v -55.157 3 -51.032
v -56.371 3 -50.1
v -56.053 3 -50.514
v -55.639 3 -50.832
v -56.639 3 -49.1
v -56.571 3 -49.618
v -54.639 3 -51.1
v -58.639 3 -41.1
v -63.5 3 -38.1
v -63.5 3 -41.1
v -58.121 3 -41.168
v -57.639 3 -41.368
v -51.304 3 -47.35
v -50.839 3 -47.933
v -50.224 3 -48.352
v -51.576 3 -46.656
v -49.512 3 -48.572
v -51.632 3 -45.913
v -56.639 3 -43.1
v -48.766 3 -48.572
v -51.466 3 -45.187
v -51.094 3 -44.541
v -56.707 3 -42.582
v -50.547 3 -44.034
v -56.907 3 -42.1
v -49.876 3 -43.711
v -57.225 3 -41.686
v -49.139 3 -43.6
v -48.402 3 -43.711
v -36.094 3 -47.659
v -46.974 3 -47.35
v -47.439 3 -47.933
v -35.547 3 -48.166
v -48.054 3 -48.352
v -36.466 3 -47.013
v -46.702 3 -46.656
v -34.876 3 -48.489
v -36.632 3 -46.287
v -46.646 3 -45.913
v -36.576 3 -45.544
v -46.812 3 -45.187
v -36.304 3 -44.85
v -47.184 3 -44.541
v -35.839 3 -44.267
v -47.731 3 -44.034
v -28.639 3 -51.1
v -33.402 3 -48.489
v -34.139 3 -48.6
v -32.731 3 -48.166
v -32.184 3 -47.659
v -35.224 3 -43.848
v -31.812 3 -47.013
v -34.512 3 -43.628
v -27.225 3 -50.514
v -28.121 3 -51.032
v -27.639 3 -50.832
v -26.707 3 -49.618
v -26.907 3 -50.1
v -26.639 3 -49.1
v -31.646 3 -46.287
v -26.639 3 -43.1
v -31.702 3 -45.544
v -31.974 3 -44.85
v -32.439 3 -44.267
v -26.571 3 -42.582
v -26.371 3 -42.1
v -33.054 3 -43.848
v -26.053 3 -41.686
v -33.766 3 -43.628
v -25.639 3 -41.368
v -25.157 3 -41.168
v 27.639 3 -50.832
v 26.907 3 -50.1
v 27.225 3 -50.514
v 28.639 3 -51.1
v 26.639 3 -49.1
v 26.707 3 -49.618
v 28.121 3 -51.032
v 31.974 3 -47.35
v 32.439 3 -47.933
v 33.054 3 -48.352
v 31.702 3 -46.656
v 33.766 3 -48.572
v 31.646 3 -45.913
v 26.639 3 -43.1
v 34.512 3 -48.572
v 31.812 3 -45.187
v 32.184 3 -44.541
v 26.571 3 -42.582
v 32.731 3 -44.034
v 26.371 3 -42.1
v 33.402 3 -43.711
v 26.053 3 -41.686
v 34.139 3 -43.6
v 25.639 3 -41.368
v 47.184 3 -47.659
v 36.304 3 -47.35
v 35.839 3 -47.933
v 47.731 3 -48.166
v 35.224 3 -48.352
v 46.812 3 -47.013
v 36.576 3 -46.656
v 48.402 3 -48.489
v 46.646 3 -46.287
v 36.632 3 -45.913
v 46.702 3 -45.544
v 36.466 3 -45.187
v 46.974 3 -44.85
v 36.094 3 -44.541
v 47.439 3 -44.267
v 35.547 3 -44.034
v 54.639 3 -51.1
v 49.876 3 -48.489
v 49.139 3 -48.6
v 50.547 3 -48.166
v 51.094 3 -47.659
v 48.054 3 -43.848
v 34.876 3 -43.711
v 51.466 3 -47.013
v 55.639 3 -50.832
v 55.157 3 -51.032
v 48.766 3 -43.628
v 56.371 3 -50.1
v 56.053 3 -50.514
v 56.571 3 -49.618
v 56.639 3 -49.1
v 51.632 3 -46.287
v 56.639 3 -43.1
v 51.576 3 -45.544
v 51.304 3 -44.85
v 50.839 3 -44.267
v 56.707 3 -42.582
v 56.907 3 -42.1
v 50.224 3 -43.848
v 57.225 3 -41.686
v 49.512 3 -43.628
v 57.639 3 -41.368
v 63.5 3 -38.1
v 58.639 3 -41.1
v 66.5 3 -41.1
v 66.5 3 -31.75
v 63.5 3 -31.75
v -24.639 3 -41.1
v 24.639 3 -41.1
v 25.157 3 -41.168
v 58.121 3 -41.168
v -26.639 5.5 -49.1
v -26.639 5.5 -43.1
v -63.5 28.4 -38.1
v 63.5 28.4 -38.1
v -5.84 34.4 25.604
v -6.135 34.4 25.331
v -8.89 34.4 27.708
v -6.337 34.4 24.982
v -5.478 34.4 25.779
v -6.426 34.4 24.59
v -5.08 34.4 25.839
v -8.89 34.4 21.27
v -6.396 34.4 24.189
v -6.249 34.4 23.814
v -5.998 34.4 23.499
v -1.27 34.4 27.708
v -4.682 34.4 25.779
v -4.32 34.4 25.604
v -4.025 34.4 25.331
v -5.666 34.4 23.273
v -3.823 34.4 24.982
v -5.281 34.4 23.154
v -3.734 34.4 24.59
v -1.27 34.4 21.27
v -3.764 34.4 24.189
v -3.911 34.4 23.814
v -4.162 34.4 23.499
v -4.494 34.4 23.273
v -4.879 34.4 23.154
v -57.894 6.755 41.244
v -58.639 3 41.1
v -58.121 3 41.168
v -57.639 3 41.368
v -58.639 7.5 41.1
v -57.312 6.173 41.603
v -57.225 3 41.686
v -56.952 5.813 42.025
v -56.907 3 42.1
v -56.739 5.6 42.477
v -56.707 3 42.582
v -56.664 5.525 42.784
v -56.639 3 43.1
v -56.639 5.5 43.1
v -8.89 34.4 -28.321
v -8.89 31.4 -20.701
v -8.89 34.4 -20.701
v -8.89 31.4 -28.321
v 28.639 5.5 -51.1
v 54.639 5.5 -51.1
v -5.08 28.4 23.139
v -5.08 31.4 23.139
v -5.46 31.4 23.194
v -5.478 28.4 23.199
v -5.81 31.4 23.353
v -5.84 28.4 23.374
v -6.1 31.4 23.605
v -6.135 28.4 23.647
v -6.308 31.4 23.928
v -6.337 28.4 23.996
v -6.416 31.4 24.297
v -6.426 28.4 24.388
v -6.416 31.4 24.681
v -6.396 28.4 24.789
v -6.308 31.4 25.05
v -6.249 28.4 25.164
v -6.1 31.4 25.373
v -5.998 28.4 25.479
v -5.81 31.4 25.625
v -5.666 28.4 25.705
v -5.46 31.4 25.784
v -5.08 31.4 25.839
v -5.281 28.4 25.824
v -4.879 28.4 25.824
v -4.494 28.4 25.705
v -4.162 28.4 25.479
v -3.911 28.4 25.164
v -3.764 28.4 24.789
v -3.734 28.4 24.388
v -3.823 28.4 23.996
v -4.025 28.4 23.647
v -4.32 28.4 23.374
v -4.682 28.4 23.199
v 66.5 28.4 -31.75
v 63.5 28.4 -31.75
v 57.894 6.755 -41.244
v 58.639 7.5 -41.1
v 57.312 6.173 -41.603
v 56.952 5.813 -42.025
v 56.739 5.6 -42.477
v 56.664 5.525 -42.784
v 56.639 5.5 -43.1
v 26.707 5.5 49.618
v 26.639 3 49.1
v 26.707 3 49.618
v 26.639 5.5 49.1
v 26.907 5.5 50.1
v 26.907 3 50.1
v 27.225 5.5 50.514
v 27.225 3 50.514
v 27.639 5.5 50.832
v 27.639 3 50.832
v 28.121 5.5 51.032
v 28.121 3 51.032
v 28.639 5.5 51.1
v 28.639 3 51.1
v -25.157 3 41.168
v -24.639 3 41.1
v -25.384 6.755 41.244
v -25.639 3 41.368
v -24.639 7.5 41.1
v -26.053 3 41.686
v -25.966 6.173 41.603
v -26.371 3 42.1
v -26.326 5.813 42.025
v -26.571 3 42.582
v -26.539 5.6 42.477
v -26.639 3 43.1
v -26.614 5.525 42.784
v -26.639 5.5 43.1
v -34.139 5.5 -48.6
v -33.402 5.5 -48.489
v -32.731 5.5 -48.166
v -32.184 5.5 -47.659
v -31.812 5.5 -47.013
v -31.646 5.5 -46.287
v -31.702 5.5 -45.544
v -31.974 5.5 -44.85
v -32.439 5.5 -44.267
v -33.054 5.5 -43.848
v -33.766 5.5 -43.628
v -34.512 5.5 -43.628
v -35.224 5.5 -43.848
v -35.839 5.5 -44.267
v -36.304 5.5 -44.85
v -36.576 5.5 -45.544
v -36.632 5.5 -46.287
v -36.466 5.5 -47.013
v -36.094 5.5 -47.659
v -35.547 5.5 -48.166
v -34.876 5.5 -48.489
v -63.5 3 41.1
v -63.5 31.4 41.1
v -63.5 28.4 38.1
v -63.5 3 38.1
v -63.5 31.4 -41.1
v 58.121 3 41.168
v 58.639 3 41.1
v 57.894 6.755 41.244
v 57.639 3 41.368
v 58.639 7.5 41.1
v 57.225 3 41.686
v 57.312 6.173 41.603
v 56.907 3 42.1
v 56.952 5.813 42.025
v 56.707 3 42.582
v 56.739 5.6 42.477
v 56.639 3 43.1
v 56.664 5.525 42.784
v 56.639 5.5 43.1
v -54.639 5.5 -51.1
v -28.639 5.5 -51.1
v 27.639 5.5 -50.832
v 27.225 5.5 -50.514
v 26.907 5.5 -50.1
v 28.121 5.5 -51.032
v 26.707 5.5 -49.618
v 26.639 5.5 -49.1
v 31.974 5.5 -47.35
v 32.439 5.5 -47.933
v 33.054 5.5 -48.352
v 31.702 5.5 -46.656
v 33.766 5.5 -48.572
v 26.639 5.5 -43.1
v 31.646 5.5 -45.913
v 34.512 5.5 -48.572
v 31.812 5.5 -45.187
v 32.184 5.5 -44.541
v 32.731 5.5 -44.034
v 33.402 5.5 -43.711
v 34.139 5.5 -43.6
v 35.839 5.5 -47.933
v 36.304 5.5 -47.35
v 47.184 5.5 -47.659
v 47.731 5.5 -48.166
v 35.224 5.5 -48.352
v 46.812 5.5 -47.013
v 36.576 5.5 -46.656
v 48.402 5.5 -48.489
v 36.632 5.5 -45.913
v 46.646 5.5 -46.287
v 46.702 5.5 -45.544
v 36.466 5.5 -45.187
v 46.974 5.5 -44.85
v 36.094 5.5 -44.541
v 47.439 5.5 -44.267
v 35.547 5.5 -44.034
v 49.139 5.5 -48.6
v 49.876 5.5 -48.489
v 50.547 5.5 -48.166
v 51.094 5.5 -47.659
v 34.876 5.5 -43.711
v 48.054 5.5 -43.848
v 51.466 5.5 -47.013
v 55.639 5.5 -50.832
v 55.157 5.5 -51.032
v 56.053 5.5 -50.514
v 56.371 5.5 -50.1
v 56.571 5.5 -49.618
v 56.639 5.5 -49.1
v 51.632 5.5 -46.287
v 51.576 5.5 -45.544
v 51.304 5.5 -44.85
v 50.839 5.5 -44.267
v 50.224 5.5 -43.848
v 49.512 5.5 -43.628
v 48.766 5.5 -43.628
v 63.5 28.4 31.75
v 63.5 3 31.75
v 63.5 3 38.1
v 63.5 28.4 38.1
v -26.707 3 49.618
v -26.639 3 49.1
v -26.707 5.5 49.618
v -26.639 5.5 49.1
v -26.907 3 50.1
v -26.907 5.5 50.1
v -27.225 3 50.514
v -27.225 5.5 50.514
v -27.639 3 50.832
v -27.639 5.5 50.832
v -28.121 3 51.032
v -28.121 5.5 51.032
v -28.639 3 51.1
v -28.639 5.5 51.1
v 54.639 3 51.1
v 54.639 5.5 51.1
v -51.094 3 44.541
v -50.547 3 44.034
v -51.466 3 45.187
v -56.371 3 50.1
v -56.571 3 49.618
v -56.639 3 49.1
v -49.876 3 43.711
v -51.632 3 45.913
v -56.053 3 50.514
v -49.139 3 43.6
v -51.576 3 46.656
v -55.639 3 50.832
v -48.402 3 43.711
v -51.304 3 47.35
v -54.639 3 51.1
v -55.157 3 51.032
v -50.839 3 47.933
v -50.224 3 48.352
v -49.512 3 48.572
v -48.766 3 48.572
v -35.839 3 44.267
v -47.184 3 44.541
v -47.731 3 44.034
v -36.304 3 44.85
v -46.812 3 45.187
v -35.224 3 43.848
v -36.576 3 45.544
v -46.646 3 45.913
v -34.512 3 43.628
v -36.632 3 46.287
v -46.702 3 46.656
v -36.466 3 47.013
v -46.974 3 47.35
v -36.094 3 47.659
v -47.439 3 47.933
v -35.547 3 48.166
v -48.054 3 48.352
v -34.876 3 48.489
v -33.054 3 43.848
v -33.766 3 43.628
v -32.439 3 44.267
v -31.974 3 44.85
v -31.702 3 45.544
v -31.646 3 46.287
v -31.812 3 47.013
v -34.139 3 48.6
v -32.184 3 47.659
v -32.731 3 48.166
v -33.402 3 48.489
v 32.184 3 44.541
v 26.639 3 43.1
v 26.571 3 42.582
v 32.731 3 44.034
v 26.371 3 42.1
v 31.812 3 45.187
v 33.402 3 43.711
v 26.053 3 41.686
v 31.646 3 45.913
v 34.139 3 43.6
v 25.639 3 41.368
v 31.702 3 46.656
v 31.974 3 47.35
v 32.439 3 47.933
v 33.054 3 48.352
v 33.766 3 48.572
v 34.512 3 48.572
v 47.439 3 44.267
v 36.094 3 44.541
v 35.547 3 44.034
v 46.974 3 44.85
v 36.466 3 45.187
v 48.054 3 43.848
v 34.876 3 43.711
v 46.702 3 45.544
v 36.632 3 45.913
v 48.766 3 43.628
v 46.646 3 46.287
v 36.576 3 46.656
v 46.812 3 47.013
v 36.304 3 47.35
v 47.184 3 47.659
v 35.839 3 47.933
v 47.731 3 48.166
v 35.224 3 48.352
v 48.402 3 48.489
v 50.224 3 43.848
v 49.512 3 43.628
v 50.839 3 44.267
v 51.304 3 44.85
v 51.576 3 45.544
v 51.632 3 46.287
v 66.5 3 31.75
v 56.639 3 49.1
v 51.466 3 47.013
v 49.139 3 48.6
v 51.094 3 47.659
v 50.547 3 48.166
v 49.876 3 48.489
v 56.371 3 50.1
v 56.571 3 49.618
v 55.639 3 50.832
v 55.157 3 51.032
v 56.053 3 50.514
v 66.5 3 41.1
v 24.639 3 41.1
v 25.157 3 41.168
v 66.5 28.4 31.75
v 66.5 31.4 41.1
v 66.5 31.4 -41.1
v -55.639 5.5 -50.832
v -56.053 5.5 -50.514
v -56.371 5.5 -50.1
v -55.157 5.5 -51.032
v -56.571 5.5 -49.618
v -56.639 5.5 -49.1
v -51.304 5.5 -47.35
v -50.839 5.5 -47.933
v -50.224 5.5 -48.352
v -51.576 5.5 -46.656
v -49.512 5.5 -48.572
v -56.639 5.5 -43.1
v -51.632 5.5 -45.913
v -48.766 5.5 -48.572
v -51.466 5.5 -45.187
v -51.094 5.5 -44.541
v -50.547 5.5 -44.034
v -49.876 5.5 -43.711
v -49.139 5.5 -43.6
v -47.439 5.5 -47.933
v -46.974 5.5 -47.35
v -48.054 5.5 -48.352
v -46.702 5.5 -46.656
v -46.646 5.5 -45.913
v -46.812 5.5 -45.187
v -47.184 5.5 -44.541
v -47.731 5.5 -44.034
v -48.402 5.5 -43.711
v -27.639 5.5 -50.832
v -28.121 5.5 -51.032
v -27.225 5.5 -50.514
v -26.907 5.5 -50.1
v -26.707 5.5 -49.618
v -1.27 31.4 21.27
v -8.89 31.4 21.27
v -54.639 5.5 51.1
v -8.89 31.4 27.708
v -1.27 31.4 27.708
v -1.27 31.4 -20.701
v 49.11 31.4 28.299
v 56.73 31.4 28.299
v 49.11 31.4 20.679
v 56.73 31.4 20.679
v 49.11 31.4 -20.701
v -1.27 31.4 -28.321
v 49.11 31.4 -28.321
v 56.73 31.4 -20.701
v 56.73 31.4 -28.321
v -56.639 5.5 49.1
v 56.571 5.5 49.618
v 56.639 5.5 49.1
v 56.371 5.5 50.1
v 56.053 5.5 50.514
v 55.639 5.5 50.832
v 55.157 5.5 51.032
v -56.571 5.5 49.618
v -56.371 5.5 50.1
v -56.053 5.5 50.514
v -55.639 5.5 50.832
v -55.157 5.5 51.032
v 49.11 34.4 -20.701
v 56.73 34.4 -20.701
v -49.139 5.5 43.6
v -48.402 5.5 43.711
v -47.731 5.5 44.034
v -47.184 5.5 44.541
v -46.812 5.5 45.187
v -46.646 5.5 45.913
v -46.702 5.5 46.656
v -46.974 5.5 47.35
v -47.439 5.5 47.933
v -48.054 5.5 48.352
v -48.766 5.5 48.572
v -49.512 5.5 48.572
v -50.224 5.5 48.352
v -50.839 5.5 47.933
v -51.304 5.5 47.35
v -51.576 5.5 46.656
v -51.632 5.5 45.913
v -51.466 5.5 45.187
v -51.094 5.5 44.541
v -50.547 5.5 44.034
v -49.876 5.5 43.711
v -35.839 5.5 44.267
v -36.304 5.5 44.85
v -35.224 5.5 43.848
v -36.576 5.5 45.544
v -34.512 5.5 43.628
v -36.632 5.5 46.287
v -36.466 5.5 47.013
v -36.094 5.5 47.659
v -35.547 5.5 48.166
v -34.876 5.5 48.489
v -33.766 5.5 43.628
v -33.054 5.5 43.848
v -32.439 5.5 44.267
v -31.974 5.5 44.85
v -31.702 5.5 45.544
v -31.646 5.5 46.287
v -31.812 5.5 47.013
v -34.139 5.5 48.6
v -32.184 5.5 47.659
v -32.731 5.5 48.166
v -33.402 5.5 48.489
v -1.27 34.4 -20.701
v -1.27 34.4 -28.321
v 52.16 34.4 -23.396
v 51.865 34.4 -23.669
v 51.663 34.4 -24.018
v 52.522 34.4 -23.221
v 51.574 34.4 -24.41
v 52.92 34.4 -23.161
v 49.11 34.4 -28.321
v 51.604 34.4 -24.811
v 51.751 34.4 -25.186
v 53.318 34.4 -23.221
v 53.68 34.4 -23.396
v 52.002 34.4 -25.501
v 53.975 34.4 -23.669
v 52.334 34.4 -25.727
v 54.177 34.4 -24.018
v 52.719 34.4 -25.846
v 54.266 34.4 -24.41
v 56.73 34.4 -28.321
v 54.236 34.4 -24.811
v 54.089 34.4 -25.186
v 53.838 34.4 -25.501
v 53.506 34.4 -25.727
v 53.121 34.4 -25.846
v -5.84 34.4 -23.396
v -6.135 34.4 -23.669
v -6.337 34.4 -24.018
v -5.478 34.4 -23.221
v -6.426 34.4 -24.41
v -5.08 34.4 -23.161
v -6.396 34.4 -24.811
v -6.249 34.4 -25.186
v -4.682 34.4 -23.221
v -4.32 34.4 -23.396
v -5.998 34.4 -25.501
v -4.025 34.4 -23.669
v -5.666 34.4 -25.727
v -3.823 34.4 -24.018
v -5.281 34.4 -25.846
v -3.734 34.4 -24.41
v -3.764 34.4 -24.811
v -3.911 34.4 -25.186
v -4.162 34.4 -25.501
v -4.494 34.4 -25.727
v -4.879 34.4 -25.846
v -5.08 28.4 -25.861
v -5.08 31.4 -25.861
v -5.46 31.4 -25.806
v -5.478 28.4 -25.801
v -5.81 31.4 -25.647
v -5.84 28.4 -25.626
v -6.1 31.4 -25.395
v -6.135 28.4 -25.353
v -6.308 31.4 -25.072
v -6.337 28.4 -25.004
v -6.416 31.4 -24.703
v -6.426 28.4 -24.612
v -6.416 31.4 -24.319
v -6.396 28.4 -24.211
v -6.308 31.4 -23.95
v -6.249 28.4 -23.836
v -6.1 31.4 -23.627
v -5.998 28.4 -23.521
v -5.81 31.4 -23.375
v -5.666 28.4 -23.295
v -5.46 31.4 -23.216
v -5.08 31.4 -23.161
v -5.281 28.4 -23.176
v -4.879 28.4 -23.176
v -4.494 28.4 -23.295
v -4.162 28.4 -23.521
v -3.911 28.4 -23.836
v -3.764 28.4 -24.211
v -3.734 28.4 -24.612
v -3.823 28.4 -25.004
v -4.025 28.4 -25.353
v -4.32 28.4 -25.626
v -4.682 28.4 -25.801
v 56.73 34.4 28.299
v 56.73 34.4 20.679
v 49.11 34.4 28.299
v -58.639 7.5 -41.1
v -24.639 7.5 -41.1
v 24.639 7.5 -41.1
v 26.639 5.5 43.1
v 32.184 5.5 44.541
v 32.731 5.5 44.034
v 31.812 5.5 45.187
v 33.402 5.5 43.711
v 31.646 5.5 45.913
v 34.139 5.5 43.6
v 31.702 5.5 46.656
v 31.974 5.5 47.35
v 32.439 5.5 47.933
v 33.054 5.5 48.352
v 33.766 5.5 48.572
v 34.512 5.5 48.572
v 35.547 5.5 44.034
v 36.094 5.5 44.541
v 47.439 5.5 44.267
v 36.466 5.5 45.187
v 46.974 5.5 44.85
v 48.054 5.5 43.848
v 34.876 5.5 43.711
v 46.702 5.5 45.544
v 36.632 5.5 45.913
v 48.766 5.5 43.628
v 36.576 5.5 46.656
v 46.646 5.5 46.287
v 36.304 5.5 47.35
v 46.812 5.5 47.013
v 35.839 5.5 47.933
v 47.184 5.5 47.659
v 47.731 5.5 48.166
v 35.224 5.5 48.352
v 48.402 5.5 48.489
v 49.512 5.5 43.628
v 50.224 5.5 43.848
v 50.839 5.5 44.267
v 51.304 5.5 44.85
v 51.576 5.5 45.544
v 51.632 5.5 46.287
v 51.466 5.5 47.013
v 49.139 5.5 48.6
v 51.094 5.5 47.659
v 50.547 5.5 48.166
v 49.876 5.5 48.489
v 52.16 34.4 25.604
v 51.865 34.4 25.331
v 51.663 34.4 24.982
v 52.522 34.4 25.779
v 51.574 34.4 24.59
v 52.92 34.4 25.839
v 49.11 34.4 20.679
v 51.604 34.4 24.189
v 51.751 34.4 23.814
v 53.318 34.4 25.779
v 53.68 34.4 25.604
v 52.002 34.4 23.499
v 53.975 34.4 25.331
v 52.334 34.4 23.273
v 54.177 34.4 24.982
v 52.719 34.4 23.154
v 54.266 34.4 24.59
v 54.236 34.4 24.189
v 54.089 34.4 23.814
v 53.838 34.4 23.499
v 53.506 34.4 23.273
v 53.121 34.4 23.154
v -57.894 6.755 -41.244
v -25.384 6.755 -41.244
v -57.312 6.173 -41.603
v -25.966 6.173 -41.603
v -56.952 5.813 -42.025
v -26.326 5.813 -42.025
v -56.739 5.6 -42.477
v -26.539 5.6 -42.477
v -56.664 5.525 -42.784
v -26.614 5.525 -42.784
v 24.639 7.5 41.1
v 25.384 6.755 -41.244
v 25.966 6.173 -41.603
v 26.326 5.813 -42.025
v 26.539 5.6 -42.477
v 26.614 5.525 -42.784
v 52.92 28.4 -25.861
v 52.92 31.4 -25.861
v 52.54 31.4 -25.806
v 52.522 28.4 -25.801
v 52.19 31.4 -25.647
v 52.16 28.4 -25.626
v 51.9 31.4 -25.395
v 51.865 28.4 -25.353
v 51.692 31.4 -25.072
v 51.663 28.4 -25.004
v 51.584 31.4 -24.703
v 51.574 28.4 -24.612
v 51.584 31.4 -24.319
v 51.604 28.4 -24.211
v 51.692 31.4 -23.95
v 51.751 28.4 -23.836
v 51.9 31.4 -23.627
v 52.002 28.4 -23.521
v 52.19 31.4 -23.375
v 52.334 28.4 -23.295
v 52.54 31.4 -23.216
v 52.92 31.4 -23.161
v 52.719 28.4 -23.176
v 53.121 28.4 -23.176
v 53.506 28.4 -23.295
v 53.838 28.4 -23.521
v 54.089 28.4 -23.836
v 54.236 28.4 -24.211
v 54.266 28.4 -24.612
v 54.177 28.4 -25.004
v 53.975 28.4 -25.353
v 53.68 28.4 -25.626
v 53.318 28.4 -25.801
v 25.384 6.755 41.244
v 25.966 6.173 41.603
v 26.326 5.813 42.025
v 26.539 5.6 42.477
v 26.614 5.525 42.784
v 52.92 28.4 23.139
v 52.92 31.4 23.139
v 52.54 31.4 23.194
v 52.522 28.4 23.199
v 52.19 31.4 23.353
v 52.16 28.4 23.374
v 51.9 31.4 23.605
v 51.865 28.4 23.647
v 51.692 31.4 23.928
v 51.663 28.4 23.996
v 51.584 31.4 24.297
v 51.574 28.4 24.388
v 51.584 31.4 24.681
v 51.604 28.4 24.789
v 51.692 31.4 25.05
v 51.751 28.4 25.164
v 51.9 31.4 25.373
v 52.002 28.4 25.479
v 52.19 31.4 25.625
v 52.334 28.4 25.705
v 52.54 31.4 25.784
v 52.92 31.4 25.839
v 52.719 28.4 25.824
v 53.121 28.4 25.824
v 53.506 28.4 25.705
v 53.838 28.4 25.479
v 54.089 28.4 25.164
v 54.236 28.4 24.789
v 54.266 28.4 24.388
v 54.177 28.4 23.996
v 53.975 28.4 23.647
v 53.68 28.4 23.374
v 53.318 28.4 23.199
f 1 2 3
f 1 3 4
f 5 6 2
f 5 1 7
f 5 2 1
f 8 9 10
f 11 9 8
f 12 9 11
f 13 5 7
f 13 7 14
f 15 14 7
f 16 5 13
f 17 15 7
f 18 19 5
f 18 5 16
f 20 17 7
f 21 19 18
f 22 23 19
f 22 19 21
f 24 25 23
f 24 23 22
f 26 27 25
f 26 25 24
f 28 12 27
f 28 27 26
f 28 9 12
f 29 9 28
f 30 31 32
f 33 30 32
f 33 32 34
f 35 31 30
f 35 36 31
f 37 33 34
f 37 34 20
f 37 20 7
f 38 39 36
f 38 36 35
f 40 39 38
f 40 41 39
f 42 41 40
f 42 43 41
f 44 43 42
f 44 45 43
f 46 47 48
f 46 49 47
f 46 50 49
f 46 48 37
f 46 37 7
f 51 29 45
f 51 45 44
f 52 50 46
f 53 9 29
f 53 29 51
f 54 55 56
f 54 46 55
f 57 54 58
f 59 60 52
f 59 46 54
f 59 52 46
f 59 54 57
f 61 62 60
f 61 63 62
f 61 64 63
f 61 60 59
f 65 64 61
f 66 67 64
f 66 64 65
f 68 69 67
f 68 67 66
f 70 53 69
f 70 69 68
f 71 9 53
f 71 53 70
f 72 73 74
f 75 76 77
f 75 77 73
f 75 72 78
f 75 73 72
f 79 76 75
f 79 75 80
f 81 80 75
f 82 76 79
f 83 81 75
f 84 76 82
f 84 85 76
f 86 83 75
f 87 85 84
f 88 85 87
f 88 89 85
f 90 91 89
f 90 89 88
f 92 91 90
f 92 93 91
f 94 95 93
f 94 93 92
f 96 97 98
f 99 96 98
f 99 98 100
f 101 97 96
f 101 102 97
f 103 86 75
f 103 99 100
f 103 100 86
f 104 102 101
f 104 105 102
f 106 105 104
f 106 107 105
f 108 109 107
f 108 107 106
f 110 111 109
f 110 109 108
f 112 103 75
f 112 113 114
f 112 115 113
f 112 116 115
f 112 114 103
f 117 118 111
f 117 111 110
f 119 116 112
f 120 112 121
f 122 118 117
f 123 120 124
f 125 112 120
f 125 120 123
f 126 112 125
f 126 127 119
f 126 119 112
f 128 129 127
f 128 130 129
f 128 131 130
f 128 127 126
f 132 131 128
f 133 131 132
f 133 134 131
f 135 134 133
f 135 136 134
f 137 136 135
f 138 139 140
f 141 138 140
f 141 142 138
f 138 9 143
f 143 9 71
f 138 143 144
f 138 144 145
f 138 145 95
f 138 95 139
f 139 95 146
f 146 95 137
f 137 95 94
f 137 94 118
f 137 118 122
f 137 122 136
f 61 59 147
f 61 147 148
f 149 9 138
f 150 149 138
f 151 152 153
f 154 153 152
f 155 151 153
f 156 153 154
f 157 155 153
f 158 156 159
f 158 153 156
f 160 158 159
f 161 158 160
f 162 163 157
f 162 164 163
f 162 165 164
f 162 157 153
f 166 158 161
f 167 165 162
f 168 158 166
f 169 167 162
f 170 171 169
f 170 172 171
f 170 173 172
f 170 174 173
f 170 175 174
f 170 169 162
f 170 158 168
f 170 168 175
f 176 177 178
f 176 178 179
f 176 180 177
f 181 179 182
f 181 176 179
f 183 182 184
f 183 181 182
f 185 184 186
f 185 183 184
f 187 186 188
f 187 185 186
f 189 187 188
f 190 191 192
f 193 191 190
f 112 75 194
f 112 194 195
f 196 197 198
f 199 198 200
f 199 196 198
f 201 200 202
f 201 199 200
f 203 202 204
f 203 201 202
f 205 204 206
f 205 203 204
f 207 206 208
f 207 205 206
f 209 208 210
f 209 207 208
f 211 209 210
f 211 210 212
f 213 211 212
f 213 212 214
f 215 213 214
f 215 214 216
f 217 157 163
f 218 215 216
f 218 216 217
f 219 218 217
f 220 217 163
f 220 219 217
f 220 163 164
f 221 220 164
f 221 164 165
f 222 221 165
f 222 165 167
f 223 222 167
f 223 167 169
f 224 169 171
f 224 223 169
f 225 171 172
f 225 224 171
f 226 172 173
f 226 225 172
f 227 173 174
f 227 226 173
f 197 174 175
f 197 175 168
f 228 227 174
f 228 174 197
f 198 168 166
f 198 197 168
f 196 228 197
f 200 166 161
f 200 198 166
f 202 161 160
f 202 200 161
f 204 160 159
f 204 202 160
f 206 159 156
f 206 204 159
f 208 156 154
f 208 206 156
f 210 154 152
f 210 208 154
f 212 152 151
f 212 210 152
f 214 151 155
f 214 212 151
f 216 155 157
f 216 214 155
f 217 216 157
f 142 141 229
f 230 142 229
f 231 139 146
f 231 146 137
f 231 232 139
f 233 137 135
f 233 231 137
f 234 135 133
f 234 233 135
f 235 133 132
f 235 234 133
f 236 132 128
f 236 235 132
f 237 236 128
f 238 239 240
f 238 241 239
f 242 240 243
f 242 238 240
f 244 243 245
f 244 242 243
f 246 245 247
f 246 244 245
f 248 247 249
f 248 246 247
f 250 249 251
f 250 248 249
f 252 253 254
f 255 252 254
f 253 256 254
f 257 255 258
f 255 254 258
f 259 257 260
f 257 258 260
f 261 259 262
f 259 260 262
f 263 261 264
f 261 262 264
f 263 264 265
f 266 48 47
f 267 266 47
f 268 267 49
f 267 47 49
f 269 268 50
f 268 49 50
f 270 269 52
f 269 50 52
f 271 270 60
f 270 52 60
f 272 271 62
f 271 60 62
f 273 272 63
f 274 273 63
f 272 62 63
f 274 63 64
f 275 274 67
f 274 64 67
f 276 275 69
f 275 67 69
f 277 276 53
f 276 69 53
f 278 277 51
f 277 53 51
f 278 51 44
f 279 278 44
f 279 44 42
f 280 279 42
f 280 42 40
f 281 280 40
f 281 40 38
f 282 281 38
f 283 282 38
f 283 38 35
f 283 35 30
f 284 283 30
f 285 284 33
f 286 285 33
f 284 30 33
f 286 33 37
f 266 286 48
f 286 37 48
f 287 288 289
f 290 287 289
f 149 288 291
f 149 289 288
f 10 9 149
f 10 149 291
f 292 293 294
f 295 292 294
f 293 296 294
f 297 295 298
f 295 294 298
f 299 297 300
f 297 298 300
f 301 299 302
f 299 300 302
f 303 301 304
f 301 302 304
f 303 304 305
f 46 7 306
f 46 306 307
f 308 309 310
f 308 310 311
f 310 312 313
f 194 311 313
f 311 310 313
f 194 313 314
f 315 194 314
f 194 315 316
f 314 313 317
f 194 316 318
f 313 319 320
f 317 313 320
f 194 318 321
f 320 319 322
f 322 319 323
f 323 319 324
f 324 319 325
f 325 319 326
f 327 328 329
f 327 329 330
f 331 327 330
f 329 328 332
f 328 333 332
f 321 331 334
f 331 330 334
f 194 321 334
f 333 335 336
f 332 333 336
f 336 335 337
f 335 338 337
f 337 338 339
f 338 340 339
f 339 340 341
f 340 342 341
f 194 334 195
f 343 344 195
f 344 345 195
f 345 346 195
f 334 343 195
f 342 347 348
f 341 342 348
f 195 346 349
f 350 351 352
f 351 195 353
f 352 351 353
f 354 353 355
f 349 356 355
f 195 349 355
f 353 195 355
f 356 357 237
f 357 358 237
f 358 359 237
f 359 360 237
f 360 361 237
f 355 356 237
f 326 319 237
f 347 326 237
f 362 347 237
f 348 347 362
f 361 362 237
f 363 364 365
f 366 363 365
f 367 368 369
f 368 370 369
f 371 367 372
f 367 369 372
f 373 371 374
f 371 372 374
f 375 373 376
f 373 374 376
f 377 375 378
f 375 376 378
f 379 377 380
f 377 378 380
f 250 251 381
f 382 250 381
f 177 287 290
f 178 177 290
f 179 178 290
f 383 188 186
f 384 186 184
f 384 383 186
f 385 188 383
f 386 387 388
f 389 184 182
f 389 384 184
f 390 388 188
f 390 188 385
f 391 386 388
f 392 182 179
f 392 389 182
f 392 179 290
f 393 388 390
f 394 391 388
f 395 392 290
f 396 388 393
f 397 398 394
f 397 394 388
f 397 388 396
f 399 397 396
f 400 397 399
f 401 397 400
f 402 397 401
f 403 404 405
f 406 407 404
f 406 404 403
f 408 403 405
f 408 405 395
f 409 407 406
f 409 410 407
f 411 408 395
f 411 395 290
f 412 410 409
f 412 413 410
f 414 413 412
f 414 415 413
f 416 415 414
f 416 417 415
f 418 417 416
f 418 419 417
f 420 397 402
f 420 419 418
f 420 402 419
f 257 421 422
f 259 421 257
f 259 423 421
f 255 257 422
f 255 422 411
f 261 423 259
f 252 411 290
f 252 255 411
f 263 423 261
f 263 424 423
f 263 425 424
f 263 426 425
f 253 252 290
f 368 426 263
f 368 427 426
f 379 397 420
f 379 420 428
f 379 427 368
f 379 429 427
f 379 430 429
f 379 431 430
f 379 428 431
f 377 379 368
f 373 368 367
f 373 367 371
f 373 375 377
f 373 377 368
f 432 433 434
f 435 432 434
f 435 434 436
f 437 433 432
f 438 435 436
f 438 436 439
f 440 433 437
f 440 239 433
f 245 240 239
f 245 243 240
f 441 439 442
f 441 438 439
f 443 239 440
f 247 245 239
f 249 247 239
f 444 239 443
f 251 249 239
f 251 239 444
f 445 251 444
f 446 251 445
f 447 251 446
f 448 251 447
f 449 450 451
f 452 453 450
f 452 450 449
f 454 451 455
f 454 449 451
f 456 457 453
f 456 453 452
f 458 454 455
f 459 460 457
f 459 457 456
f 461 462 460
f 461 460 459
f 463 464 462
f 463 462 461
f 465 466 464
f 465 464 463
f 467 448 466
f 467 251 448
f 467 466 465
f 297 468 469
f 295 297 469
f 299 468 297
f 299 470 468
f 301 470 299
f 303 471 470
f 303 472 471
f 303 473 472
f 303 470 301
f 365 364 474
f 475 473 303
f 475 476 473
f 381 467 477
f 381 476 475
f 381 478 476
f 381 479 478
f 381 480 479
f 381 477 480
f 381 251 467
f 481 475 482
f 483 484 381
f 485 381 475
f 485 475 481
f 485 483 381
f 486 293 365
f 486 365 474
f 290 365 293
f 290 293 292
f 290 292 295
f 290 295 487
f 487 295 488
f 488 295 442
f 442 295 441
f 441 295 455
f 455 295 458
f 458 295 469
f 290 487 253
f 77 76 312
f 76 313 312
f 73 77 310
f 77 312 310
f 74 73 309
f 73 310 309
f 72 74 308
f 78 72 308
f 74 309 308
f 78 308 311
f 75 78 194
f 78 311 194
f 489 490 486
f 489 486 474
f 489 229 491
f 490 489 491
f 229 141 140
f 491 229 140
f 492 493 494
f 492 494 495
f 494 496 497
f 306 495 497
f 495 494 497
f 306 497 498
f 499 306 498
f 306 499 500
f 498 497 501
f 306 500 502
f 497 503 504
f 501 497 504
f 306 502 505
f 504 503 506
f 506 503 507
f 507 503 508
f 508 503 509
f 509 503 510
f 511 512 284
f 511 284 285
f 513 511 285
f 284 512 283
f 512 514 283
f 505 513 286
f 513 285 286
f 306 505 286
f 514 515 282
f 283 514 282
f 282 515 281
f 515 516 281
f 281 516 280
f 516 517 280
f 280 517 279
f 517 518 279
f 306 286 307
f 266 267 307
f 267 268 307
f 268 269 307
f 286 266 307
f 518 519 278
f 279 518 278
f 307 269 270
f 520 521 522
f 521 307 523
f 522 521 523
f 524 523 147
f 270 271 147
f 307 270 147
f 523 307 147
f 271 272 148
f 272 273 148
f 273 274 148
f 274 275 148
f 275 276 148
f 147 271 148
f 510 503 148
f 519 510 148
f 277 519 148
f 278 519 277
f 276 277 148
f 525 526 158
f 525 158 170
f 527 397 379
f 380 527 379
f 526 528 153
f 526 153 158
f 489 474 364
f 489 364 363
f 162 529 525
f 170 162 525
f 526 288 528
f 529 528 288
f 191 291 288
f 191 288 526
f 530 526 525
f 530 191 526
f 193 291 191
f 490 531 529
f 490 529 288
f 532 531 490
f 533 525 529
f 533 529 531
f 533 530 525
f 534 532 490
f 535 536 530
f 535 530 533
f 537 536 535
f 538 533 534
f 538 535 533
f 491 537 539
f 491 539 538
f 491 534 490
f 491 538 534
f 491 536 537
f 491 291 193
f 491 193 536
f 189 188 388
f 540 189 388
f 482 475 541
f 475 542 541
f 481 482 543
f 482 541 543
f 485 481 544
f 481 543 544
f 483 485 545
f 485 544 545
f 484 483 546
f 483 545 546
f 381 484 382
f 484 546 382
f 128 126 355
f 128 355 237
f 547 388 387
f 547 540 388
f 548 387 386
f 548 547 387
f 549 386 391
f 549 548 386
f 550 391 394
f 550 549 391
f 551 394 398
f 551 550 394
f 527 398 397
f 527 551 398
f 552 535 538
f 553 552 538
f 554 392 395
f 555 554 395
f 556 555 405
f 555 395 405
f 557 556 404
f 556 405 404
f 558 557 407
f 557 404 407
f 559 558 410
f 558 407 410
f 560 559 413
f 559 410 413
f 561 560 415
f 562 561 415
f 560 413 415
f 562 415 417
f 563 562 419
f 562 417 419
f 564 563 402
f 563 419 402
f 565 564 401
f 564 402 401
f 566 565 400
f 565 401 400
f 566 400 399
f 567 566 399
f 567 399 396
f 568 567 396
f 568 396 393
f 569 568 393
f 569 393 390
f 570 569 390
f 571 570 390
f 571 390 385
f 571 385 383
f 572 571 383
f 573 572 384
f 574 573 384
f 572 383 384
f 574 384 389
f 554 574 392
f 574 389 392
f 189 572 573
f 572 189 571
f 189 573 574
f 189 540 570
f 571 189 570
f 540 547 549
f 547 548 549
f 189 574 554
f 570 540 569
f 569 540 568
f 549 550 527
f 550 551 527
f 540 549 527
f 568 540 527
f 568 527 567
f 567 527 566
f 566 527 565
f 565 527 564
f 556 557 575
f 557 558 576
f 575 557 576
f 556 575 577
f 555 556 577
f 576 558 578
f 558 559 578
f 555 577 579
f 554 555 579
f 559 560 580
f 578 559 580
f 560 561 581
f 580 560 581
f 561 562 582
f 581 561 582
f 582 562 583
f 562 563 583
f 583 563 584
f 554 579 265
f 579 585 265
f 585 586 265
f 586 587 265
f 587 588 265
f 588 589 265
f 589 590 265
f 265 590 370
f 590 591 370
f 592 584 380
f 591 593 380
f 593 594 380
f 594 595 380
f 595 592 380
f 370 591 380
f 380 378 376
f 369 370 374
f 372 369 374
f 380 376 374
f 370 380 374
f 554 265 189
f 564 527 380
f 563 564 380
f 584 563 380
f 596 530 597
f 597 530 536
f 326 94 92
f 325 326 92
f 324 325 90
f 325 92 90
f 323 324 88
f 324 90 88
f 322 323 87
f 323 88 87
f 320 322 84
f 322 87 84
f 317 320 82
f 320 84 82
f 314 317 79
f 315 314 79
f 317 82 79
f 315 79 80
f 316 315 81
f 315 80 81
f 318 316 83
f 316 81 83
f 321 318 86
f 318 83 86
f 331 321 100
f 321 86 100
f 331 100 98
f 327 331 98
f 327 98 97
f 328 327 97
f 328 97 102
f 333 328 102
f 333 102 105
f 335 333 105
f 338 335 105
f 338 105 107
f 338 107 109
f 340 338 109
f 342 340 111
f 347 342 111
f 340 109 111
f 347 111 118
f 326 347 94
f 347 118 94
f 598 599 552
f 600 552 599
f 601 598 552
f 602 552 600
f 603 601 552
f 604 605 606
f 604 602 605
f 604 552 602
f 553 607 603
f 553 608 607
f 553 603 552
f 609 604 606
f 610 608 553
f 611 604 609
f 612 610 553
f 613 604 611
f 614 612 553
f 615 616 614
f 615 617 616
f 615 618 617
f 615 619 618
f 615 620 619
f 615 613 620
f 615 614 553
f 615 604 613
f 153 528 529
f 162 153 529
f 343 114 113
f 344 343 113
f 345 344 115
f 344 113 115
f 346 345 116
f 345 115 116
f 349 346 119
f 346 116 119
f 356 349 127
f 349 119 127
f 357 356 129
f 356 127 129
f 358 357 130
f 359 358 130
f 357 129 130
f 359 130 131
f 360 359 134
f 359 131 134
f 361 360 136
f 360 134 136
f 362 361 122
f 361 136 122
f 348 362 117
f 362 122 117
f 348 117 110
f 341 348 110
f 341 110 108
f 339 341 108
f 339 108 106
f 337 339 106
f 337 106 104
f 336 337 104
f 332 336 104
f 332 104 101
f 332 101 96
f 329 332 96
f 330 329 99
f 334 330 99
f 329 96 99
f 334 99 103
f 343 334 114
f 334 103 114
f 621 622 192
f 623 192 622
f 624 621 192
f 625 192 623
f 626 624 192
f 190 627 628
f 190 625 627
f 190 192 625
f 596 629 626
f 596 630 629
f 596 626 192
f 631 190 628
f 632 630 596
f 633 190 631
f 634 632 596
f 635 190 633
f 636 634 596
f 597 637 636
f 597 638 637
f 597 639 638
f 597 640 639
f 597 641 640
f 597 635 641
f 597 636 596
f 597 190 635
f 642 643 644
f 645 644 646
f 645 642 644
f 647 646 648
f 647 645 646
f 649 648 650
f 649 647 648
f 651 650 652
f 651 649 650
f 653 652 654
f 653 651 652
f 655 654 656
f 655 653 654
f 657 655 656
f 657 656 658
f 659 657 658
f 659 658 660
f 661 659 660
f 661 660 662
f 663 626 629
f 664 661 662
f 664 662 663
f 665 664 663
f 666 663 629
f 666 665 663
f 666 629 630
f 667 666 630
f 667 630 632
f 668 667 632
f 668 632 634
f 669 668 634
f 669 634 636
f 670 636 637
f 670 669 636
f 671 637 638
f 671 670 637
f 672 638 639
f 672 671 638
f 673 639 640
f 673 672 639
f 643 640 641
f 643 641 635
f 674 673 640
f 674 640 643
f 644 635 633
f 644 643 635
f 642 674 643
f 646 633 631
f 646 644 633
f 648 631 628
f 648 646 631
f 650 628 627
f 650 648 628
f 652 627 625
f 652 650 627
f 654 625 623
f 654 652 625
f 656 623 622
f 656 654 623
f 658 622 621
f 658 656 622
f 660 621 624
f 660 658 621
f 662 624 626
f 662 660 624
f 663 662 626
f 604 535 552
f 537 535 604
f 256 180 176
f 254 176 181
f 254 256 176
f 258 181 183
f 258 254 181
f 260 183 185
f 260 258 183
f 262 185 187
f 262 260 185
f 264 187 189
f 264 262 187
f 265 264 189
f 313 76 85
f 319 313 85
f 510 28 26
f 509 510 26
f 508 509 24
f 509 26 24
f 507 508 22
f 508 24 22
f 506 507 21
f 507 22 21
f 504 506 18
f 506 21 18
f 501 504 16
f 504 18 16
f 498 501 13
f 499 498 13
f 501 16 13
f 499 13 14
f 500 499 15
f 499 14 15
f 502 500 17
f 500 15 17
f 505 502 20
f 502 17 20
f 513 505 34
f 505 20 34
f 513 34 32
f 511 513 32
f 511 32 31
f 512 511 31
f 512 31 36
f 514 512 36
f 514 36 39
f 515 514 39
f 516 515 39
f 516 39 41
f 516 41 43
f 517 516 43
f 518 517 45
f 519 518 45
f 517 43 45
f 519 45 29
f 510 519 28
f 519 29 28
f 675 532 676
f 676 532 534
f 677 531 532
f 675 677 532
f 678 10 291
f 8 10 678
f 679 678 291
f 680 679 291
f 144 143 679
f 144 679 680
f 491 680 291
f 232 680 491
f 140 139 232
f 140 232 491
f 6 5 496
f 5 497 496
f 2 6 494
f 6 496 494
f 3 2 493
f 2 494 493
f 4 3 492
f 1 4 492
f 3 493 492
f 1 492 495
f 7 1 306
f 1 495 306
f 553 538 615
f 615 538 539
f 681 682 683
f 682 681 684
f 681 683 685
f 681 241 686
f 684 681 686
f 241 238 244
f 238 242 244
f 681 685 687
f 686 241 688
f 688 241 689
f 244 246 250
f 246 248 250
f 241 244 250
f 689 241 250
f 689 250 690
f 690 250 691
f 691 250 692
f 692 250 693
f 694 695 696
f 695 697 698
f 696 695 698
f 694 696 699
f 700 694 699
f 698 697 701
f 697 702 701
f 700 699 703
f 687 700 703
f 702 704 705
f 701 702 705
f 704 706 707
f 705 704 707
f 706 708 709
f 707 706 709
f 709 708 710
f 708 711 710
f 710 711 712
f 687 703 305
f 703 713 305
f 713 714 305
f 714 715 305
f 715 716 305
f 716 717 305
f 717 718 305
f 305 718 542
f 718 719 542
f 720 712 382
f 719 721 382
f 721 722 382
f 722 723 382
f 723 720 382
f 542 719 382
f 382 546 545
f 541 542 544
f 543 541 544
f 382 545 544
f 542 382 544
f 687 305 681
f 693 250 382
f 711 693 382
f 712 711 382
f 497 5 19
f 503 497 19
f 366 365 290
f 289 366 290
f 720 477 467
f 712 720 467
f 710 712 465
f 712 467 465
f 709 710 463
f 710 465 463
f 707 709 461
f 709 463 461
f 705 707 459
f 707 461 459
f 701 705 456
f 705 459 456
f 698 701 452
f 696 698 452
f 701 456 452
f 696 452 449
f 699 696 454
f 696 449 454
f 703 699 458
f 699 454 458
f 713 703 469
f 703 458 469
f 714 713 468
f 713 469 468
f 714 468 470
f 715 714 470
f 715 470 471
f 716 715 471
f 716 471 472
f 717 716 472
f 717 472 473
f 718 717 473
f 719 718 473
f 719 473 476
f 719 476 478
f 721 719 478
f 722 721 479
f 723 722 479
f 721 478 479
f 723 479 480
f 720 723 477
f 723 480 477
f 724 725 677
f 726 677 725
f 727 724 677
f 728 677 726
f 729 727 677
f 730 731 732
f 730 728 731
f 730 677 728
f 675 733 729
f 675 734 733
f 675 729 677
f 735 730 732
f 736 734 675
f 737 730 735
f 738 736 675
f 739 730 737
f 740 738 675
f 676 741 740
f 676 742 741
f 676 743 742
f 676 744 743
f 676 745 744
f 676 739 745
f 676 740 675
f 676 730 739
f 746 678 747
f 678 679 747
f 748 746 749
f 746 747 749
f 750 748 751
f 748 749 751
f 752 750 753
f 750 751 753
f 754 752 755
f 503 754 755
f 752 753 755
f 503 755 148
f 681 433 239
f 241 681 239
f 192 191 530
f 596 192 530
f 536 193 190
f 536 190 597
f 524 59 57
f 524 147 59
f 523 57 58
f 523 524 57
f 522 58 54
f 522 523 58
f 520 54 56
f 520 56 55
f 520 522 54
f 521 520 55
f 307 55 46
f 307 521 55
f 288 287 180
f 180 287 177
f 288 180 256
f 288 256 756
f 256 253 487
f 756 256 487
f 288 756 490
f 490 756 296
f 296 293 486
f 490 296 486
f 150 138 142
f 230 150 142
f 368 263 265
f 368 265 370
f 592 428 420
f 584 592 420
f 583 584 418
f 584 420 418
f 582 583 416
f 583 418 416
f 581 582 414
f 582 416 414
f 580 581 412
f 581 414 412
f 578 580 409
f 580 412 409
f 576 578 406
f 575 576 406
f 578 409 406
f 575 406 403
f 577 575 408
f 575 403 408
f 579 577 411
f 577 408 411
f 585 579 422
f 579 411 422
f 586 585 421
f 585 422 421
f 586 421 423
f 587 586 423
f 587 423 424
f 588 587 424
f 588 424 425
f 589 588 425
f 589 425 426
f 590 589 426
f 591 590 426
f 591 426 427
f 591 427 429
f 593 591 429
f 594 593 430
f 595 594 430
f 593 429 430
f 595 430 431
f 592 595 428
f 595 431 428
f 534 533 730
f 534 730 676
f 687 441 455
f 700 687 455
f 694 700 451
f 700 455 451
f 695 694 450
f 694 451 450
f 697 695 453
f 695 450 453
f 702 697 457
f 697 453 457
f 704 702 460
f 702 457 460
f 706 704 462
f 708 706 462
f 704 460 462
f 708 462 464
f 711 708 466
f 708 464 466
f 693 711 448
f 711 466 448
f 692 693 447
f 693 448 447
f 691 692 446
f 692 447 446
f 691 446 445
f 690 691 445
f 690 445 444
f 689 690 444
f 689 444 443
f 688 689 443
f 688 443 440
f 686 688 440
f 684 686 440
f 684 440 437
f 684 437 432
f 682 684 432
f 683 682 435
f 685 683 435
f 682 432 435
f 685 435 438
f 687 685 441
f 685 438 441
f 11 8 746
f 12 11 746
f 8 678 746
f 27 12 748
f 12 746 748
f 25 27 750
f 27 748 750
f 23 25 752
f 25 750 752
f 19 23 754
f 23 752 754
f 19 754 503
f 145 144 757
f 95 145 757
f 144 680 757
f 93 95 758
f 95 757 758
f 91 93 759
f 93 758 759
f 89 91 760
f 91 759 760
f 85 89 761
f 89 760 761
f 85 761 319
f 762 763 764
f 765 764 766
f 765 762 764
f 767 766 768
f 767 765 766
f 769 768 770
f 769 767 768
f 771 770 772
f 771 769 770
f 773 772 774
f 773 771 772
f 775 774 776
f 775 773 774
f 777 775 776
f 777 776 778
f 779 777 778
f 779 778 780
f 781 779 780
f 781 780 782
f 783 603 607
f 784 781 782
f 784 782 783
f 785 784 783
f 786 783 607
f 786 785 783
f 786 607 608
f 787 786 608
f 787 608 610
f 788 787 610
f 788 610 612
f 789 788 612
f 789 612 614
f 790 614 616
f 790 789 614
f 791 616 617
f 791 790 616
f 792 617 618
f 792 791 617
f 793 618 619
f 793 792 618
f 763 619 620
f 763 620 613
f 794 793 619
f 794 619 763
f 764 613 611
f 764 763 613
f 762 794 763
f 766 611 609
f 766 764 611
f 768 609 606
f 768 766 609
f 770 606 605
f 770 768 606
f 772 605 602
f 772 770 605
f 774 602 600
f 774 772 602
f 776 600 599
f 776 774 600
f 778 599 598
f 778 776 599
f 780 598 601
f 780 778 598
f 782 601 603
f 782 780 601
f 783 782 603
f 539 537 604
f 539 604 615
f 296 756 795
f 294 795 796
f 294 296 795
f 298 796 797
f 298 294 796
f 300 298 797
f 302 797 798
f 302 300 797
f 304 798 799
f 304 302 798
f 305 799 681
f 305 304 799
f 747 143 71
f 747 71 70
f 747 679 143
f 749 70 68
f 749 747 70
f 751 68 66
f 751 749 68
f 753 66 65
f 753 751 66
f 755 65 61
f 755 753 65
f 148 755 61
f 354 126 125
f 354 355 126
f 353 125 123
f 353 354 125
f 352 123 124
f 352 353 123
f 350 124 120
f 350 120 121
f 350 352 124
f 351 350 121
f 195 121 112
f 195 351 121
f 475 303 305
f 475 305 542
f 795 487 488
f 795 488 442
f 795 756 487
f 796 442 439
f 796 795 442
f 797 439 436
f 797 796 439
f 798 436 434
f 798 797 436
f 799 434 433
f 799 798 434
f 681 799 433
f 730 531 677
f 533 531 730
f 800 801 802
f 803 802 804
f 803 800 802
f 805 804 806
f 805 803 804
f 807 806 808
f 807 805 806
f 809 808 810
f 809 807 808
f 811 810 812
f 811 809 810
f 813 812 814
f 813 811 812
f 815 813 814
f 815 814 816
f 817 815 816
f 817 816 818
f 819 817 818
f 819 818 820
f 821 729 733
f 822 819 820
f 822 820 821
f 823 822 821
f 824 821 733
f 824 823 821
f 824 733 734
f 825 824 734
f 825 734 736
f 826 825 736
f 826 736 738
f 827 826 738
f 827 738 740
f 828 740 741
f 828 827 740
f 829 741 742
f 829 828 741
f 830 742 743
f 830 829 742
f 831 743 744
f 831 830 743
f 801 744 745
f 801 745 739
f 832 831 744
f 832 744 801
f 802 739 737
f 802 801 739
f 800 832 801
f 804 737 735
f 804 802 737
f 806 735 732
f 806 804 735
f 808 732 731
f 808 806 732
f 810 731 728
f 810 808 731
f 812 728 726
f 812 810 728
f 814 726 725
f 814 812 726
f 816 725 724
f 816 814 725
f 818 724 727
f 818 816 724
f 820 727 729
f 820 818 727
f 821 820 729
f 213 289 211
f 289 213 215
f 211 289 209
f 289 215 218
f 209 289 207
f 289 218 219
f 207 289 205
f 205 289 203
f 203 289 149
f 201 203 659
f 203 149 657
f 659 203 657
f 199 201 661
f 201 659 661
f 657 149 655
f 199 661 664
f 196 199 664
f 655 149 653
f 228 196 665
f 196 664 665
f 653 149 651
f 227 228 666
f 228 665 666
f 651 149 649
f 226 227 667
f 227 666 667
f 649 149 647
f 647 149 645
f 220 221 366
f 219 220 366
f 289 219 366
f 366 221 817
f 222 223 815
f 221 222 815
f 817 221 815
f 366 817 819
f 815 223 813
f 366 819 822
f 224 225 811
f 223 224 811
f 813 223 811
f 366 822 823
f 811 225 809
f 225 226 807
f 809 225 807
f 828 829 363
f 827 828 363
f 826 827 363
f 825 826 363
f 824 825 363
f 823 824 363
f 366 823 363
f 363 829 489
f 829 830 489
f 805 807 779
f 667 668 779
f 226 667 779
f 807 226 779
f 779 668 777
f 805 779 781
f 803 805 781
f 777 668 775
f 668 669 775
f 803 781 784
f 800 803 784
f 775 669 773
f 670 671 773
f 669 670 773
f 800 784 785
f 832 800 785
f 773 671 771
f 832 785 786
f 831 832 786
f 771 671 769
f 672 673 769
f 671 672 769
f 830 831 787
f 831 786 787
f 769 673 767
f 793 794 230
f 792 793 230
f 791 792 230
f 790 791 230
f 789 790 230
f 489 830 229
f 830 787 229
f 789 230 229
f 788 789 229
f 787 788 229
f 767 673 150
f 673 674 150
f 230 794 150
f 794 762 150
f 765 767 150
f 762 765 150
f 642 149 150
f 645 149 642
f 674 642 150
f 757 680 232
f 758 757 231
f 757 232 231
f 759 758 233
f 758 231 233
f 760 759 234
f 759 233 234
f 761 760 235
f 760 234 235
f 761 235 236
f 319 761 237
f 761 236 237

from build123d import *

# Parameters (mm, degrees)
SKETCH1_R                        = 2.54
SKETCH1_R_2                      = 6.35
MAINBASEPLATE_DEPTH              = 3
PIBATTERYBOXBOSS_EXTRUDE3_DEPTH  = 25.4
SKETCH7_W                        = 130
SKETCH7_H                        = 82.2
PIBATTERYTOPBOSS_EXTRUDE4_DEPTH  = 3
SKETCH8_W                        = 63.5
SKETCH8_H                        = 25.4
PIBATTERYWIRESCUT_EXTRUDE2_DEPTH = 13.16
SKETCH9_W                        = 7.62
SKETCH9_H                        = 7.62
SKETCH9_R                        = 1.35
SKETCH9_H_2                      = 6.437586206
PIBOARDBOSS_EXTRUDE5_DEPTH       = 3
SKETCH32_W                       = 712.395528774
SKETCH32_H                       = 524.196017535
CUT_EXTRUDE11_DEPTH              = 3
SKETCH33_W                       = 30
SKETCH33_H                       = 10
SKETCH33_R                       = 2.5
BOSS_EXTRUDE9_DEPTH              = 2.5
FILLET2_R                        = 2
CUT_EXTRUDE12_START              = -5
SKETCH9_2_R                      = 1.35
CUT_EXTRUDE12_DEPTH              = 5


with BuildPart() as part:
    # Sketch1 → mainbaseplate (new body)
    with BuildSketch(Plane(origin=(0, 0, 0), x_dir=(1, 0, 0), z_dir=(0, 1, 0))):
        with BuildLine():
            Line((-223.52, -111.125), (223.52, -111.125))
            ThreePointArc((223.52, -111.125), (227.112102448, -109.637102448), (228.6, -106.045))
            Line((228.6, -106.045), (228.6, 106.045))
            ThreePointArc((228.6, 106.045), (227.112102448, 109.637102448), (223.52, 111.125))
            Line((223.52, 111.125), (-223.52, 111.125))
            ThreePointArc((-223.52, 111.125), (-227.112102448, 109.637102448), (-228.6, 106.045))
            Line((-228.6, 106.045), (-228.6, -106.045))
            ThreePointArc((-228.6, -106.045), (-227.112102448, -109.637102448), (-223.52, -111.125))
        make_face()
        with Locations(Location((127, 36.5125, 0), (0, 0, 270))):
            Circle(SKETCH1_R, mode=Mode.SUBTRACT)
        with Locations(Location((127, -36.5125, 0), (0, 0, 270))):
            Circle(SKETCH1_R, mode=Mode.SUBTRACT)
        with Locations(Location((-142.24, 36.5125, 0), (0, 0, 270))):
            Circle(SKETCH1_R, mode=Mode.SUBTRACT)
        with Locations(Location((-142.24, -36.5125, 0), (0, 0, 270))):
            Circle(SKETCH1_R, mode=Mode.SUBTRACT)
        with Locations(Location((209.55, 0, 0), (0, 0, 270))):
            Circle(SKETCH1_R_2, mode=Mode.SUBTRACT)
    extrude(amount=MAINBASEPLATE_DEPTH)

    # Sketch6 → PiBatteryBoxBoss-Extrude3 (add)
    with BuildSketch(Plane(origin=(0, 3, 0), x_dir=(1, 0, 0), z_dir=(0, 1, 0))):
        Polygon((-63.5, -41.1), (66.5, -41.1), (66.5, 41.1), (-63.5, 41.1), (-63.5, 38.1), (63.5, 38.1), (63.5, -38.1), (-63.5, -38.1), align=None)
    extrude(amount=PIBATTERYBOXBOSS_EXTRUDE3_DEPTH)

    # Sketch7 → PibatterytopBoss-Extrude4 (add)
    with BuildSketch(Plane(origin=(0, 28.4, 0), x_dir=(1, 0, 0), z_dir=(0, 1, 0))):
        with Locations((1.5, 0)):
            Rectangle(SKETCH7_W, SKETCH7_H)
    extrude(amount=PIBATTERYTOPBOSS_EXTRUDE4_DEPTH)

    # Sketch8 → pibatterywiresCut-Extrude2 (cut)
    with BuildSketch(Plane(origin=(66.5, 0, 0), x_dir=(0, 0, -1), z_dir=(1, 0, 0))):
        with Locations((0, 15.7)):
            Rectangle(SKETCH8_W, SKETCH8_H)
    extrude(amount=-PIBATTERYWIRESCUT_EXTRUDE2_DEPTH, mode=Mode.SUBTRACT)

    # Sketch9 → PiBoardBoss-Extrude5 (add)
    # profile 1 of 4: a face of its own
    with BuildSketch(Plane(origin=(0, 31.4, 0), x_dir=(1, 0, 0), z_dir=(0, 1, 0))):
        with Locations((52.92, 24.511)):
            Rectangle(SKETCH9_W, SKETCH9_H)
        with Locations(Location((52.92, 24.511, 0), (0, 0, 270))):
            Circle(SKETCH9_R, mode=Mode.SUBTRACT)
    # profile 2 of 4: a face of its own
    with BuildSketch(Plane(origin=(0, 31.4, 0), x_dir=(1, 0, 0), z_dir=(0, 1, 0))):
        with Locations((52.92, -24.489)):
            Rectangle(SKETCH9_W, SKETCH9_H)
        with Locations(Location((52.92, -24.489, 0), (0, 0, 270))):
            Circle(SKETCH9_R, mode=Mode.SUBTRACT)
    # profile 3 of 4: a face of its own
    with BuildSketch(Plane(origin=(0, 31.4, 0), x_dir=(1, 0, 0), z_dir=(0, 1, 0))):
        with Locations((-5.08, 24.511)):
            Rectangle(SKETCH9_W, SKETCH9_H)
        with Locations(Location((-5.08, 24.511, 0), (0, 0, 270))):
            Circle(SKETCH9_R, mode=Mode.SUBTRACT)
    # profile 4 of 4: a face of its own
    with BuildSketch(Plane(origin=(0, 31.4, 0), x_dir=(1, 0, 0), z_dir=(0, 1, 0))):
        with Locations((-5.08, -24.489)):
            Rectangle(SKETCH9_W, SKETCH9_H_2)
        with Locations(Location((-5.08, -24.489, 0), (0, 0, 270))):
            Circle(SKETCH9_R, mode=Mode.SUBTRACT)
    extrude(amount=PIBOARDBOSS_EXTRUDE5_DEPTH)

    # Sketch32 → Cut-Extrude11 (cut)
    with BuildSketch(Plane.XZ):
        with Locations((-5.907824988, 36.768742763)):
            Rectangle(SKETCH32_W, SKETCH32_H)
    extrude(amount=-CUT_EXTRUDE11_DEPTH, mode=Mode.SUBTRACT)

    # Sketch33 → Boss-Extrude9 (add)
    # profile 1 of 4: a face of its own
    with BuildSketch(Plane.XZ.offset(-3)):
        with Locations((-41.638953423, 46.1)):
            Rectangle(SKETCH33_W, SKETCH33_H)
        with Locations(Location((-49.138953423, 46.1, 0), (0, 0, 270))):
            Circle(SKETCH33_R, mode=Mode.SUBTRACT)
        with Locations(Location((-34.138953423, 46.1, 0), (0, 0, 90))):
            Circle(SKETCH33_R, mode=Mode.SUBTRACT)
    # profile 2 of 4: a face of its own
    with BuildSketch(Plane.XZ.offset(-3)):
        with Locations((41.638953423, 46.1)):
            Rectangle(SKETCH33_W, SKETCH33_H)
        with Locations(Location((34.138953423, 46.1, 0), (0, 0, 270))):
            Circle(SKETCH33_R, mode=Mode.SUBTRACT)
        with Locations(Location((49.138953423, 46.1, 0), (0, 0, 90))):
            Circle(SKETCH33_R, mode=Mode.SUBTRACT)
    # profile 3 of 4: a face of its own
    with BuildSketch(Plane.XZ.offset(-3)):
        with Locations((41.638953423, -46.1)):
            Rectangle(SKETCH33_W, SKETCH33_H)
        with Locations(Location((49.138953423, -46.1, 0), (0, 0, 270))):
            Circle(SKETCH33_R, mode=Mode.SUBTRACT)
        with Locations(Location((34.138953423, -46.1, 0), (0, 0, 90))):
            Circle(SKETCH33_R, mode=Mode.SUBTRACT)
    # profile 4 of 4: a face of its own
    with BuildSketch(Plane.XZ.offset(-3)):
        with Locations((-41.638953423, -46.1)):
            Rectangle(SKETCH33_W, SKETCH33_H)
        with Locations(Location((-49.138953423, -46.1, 0), (0, 0, 90))):
            Circle(SKETCH33_R, mode=Mode.SUBTRACT)
        with Locations(Location((-34.138953423, -46.1, 0), (0, 0, 270))):
            Circle(SKETCH33_R, mode=Mode.SUBTRACT)
    extrude(amount=-BOSS_EXTRUDE9_DEPTH)

    # Fillet2
    fillet2_edges = [part.edges().sort_by_distance(p)[0] for p in [
        (-56.638953423, 4.25, 41.1),
        (-56.638953423, 4.25, 51.1),
        (-26.638953423, 4.25, 51.1),
        (-41.638953423, 5.5, 41.1),
        (-26.638953423, 4.25, 41.1),
        (56.638953423, 4.25, 51.1),
        (41.638953423, 5.5, 41.1),
        (56.638953423, 4.25, 41.1),
        (26.638953423, 4.25, 41.1),
        (26.638953423, 4.25, 51.1),
        (41.638953423, 5.5, -41.1),
        (26.638953423, 4.25, -41.1),
        (56.638953423, 4.25, -41.1),
        (56.638953423, 4.25, -51.1),
        (26.638953423, 4.25, -51.1),
        (-56.638953423, 4.25, -51.1),
        (-41.638953423, 5.5, -41.1),
        (-56.638953423, 4.25, -41.1),
        (-26.638953423, 4.25, -41.1),
        (-26.638953423, 4.25, -51.1),
    ]]
    fillet(fillet2_edges, radius=FILLET2_R)

    # Sketch9<2> → Cut-Extrude12 (cut)
    with BuildSketch(Plane(origin=(0, 31.4, 0), x_dir=(1, 0, 0), z_dir=(0, 1, 0)).offset(CUT_EXTRUDE12_START)):
        with Locations(Location((52.92, -24.489, 0), (0, 0, 90))):
            Circle(SKETCH9_2_R)
        with Locations(Location((-5.08, -24.489, 0), (0, 0, 90))):
            Circle(SKETCH9_2_R)
        with Locations(Location((-5.08, 24.511, 0), (0, 0, 90))):
            Circle(SKETCH9_2_R)
        with Locations(Location((52.92, 24.511, 0), (0, 0, 90))):
            Circle(SKETCH9_2_R)
    extrude(amount=CUT_EXTRUDE12_DEPTH, mode=Mode.SUBTRACT)


solid = part.part
